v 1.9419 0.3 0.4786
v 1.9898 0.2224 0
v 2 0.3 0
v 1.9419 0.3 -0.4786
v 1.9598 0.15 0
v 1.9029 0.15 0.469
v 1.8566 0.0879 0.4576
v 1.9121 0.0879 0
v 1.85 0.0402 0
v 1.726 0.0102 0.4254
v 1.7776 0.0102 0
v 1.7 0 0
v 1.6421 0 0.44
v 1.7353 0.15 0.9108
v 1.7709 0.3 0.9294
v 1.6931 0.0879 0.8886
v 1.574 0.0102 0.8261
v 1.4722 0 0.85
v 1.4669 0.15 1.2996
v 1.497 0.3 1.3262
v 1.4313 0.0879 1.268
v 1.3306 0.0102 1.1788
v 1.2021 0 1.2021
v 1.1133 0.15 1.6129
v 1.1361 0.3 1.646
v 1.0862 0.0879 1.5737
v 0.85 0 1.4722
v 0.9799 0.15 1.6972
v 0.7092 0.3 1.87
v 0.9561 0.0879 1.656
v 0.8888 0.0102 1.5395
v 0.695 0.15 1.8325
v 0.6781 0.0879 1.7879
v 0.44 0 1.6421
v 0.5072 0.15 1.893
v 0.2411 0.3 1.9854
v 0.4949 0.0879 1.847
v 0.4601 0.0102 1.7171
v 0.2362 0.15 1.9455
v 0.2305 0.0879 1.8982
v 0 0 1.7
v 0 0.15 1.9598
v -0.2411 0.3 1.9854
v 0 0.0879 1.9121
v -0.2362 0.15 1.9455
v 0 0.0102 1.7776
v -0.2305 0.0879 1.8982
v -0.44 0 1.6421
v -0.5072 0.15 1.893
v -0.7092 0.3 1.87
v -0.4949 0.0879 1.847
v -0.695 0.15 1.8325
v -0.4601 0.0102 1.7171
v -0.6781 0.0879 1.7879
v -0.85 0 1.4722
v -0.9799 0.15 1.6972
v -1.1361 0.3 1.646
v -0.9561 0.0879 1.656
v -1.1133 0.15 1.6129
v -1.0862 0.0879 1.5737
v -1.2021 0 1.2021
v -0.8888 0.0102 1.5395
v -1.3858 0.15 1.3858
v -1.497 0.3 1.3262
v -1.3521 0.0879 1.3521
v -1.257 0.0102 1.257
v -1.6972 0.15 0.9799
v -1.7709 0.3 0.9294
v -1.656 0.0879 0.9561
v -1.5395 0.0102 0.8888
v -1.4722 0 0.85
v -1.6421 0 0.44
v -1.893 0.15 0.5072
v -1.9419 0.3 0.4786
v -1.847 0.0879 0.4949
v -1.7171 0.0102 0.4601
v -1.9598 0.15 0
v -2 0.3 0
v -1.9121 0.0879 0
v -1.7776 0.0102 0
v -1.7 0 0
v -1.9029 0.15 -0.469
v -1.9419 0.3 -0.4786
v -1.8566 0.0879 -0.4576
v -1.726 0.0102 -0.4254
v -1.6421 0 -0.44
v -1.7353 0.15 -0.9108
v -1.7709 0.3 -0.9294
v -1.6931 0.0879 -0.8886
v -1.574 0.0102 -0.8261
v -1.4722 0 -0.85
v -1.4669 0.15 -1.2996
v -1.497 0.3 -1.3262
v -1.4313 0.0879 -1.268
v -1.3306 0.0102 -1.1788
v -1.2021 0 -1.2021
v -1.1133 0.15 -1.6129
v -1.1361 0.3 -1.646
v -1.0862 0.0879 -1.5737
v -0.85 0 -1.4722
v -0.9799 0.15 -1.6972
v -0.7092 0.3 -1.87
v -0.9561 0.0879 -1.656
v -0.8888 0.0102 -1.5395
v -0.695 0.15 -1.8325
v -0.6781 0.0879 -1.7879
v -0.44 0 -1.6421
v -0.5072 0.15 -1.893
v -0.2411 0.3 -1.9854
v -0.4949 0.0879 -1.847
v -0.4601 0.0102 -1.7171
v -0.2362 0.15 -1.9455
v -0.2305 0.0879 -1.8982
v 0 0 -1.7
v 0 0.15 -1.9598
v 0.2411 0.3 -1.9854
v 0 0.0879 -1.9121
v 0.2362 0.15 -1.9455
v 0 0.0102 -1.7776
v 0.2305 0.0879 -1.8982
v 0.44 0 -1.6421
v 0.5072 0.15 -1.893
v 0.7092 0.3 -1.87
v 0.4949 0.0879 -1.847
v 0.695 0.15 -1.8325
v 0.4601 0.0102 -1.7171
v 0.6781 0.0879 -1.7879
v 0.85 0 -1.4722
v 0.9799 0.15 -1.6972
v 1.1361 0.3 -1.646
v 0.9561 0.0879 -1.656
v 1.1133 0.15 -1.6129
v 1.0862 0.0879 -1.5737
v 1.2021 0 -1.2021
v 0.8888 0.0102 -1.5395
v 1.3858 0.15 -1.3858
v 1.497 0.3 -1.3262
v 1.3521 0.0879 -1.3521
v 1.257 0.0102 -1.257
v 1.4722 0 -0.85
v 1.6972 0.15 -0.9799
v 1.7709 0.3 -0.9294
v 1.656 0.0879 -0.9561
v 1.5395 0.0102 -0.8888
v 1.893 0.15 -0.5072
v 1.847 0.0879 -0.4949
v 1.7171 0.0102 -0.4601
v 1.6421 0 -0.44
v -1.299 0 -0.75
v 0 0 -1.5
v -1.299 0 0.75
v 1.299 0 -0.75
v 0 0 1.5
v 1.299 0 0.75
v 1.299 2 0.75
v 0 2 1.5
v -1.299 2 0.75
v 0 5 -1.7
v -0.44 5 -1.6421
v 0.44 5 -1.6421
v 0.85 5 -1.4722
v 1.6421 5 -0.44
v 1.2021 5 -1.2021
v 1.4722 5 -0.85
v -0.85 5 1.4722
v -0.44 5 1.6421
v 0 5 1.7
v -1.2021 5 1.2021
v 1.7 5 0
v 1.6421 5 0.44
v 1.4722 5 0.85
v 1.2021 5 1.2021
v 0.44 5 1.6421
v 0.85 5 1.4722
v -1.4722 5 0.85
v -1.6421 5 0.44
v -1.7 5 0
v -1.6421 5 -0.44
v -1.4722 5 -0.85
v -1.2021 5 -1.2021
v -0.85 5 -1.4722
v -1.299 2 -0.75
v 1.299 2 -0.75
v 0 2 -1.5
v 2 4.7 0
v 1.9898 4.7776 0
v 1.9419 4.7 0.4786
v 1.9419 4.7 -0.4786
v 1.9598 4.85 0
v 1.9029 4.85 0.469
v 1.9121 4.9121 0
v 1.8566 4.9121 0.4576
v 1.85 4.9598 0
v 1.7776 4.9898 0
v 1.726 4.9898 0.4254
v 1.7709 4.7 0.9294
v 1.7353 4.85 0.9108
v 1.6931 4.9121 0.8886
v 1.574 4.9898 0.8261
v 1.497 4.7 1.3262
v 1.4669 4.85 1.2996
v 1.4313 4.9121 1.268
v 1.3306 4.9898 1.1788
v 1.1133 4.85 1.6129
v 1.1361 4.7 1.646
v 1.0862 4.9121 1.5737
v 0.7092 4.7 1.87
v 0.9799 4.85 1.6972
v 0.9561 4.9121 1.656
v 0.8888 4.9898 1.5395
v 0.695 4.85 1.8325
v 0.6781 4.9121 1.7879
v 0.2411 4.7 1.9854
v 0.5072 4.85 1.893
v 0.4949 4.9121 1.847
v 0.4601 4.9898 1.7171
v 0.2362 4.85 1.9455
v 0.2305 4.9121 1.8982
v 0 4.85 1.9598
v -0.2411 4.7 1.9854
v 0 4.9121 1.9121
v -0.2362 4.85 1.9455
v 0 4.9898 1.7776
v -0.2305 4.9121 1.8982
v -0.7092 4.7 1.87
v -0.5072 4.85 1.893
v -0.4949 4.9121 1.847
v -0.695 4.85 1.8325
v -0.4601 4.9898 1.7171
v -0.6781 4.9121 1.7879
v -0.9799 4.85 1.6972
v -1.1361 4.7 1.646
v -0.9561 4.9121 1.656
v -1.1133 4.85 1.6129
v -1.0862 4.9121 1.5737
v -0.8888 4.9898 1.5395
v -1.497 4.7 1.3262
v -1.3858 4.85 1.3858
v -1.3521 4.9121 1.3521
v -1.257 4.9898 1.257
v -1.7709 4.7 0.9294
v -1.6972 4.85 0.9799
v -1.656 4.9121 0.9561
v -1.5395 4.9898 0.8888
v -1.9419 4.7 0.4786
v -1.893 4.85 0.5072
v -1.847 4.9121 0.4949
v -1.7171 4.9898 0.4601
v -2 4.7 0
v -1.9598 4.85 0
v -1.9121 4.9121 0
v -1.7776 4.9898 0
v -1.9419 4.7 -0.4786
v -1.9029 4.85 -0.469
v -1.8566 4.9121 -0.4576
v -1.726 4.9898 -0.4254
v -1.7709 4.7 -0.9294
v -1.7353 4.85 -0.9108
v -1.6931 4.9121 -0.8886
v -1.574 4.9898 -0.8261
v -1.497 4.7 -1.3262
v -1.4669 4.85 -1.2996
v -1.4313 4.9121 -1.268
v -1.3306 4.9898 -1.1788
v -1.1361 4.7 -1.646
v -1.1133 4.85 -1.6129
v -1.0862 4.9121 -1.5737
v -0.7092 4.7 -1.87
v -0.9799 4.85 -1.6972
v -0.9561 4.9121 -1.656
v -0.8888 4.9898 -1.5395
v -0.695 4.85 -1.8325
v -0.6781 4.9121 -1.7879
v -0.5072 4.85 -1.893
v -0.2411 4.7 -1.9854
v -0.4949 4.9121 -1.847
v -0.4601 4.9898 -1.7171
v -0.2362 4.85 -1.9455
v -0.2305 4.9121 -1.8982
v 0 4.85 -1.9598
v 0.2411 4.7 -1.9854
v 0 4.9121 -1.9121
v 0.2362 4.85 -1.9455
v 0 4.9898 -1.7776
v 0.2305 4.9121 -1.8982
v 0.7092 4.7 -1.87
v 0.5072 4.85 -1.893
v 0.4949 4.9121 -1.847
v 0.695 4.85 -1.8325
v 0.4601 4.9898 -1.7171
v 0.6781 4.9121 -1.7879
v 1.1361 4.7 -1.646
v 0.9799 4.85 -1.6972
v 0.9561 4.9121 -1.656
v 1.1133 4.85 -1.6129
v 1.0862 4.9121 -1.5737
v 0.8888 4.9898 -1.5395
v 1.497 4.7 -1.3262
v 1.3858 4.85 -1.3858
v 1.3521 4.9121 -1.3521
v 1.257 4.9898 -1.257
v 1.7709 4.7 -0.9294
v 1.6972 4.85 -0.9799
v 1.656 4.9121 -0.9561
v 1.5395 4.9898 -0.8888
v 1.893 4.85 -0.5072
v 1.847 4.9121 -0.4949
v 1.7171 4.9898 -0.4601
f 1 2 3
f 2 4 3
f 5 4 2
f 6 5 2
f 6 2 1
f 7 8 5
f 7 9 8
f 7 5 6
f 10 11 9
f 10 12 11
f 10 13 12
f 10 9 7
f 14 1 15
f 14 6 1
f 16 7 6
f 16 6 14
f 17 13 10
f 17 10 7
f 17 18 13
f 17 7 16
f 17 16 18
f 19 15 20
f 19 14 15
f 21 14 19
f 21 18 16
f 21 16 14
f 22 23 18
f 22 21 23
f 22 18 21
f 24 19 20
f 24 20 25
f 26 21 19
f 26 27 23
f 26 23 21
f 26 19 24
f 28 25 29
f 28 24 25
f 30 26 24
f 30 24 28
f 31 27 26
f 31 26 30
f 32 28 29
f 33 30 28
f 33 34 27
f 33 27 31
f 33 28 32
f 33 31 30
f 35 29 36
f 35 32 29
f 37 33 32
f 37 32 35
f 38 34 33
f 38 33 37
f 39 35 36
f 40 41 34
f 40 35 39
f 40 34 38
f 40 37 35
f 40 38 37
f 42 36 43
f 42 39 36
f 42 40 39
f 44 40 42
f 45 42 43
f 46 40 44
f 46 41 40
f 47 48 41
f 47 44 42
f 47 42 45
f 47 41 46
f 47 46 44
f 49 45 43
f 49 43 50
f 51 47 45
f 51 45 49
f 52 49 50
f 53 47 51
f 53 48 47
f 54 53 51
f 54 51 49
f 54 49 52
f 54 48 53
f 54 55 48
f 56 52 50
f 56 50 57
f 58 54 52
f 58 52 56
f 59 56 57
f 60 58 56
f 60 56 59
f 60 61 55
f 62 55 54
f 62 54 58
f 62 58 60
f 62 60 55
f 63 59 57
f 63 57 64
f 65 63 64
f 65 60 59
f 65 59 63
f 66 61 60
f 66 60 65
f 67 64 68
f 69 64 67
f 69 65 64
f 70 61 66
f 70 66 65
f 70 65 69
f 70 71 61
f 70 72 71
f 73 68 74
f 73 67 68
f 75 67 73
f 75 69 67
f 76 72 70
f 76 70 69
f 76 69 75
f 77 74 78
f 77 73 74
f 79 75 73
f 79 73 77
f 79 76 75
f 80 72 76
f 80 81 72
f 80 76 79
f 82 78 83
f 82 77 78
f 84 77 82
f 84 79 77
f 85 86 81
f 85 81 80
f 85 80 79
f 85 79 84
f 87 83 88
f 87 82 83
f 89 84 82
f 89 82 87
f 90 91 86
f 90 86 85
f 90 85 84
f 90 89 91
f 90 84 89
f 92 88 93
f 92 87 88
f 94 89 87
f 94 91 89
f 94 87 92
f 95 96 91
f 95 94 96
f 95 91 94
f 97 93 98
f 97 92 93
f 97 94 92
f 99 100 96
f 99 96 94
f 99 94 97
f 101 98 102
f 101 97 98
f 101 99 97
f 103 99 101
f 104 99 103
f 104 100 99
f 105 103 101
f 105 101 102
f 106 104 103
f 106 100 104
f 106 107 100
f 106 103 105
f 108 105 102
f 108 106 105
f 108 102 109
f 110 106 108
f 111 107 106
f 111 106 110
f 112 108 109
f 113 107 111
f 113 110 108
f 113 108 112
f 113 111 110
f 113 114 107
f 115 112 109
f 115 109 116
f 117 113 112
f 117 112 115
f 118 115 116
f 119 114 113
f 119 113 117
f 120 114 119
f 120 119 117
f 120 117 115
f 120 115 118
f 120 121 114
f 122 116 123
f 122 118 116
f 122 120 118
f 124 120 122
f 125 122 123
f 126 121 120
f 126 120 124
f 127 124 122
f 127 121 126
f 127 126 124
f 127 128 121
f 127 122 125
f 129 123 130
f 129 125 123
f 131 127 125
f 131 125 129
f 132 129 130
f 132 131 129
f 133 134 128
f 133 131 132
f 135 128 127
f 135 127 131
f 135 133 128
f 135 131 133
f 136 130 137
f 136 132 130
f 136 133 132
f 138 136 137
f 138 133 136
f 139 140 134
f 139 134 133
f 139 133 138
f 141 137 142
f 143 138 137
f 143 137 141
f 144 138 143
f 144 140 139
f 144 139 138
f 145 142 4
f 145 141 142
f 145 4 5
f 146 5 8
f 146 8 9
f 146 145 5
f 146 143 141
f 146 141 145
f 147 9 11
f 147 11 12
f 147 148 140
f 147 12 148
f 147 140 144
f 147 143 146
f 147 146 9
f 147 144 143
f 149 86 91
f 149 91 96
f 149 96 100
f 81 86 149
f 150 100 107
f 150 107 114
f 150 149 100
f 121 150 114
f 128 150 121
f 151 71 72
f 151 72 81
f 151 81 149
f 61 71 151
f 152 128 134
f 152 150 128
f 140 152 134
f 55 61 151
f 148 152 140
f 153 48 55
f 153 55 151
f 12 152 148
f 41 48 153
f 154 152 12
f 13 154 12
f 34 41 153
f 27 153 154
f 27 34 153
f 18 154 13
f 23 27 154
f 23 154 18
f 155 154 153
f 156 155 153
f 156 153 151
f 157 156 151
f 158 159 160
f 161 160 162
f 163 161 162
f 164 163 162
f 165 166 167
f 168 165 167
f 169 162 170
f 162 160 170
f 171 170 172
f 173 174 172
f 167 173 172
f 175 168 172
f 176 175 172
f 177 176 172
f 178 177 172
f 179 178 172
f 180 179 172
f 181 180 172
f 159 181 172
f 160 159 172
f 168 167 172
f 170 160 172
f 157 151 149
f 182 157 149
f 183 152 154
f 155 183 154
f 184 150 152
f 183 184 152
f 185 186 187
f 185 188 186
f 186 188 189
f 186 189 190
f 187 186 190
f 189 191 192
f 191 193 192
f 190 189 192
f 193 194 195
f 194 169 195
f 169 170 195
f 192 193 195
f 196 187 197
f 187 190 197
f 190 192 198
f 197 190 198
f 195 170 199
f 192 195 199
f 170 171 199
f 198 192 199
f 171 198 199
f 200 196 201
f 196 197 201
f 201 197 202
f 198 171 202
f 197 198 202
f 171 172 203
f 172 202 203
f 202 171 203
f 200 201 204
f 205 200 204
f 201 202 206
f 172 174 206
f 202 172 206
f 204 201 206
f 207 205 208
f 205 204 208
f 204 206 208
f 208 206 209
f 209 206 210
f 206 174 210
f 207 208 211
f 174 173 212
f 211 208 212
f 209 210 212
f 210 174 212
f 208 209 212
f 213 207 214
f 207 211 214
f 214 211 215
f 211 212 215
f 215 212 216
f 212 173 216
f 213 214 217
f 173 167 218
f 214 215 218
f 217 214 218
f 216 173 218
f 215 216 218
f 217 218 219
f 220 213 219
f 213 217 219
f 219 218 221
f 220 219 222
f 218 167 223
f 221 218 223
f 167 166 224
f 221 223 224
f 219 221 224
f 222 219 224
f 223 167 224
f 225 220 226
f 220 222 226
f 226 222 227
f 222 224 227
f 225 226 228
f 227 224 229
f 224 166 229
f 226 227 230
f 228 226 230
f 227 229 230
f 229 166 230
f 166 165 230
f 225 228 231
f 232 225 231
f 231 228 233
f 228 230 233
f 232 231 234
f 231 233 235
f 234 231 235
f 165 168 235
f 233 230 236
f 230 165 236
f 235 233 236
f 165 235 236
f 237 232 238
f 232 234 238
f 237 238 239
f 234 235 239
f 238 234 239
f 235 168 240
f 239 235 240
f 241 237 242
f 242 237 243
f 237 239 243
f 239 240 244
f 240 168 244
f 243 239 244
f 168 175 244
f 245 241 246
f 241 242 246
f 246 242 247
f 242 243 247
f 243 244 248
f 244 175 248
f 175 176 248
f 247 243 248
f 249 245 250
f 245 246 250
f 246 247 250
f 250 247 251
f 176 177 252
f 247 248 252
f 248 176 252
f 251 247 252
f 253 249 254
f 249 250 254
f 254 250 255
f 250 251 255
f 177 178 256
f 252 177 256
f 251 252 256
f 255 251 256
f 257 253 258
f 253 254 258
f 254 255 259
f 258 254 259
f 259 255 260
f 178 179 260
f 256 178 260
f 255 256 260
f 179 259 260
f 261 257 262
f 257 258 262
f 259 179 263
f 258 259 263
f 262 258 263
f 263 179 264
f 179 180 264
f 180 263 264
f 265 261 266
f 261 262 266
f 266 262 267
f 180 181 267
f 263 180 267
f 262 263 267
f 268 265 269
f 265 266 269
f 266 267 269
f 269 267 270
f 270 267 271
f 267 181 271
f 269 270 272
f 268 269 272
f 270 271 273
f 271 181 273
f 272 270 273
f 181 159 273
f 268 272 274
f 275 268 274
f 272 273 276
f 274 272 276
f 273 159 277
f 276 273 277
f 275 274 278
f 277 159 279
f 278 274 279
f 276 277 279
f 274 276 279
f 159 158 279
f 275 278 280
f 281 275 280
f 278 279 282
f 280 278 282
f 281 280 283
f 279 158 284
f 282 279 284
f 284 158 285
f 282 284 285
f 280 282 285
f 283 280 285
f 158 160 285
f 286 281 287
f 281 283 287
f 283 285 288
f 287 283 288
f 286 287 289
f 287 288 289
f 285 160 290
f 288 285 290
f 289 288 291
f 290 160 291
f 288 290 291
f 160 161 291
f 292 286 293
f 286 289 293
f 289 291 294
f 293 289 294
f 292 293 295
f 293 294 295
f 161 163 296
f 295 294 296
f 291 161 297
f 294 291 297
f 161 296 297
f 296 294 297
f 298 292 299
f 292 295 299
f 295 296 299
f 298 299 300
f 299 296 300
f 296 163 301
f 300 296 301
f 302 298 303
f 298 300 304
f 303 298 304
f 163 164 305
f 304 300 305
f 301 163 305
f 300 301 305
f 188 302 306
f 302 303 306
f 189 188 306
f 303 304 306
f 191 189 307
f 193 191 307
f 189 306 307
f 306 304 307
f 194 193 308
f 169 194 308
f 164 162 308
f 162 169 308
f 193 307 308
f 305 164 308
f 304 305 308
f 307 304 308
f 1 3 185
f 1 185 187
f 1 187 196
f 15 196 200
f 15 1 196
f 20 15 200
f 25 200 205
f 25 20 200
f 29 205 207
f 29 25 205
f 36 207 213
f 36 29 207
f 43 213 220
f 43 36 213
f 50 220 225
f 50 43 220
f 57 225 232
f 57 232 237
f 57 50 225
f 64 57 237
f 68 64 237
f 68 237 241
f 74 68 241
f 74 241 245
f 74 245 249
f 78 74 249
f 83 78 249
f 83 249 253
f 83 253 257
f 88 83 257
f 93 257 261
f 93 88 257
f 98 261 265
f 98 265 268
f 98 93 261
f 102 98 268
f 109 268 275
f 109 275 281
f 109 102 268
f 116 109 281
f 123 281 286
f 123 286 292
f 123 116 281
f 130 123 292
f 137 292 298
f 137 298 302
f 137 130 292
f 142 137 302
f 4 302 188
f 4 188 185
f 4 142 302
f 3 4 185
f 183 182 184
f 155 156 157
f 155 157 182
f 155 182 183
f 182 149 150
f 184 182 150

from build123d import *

# Parameters (mm, degrees)
F0_R     = 2
F1_DEPTH = 5
F3_DEPTH = 2
F4_R     = 0.3


with BuildPart() as f1:
    # F0 (on Front) → F1 (new body)
    with BuildSketch(Plane.XZ):
        Circle(F0_R)
    extrude(amount=-F1_DEPTH)

    # F2 (on face) → F3 (cut)
    with BuildSketch(Plane.XZ):
        Polygon((1.299038, 0.75), (0, 1.5), (-1.299038, 0.75), (-1.299038, -0.75), (0, -1.5), (1.299038, -0.75), align=None)
    extrude(amount=-F3_DEPTH, mode=Mode.SUBTRACT)

    # F4
    f4_edges = [f1.edges().sort_by_distance(p)[0] for p in [
        (-2, 0, 0),
        (-2, 5, 0),
    ]]
    fillet(f4_edges, radius=F4_R)


solid = f1.part
